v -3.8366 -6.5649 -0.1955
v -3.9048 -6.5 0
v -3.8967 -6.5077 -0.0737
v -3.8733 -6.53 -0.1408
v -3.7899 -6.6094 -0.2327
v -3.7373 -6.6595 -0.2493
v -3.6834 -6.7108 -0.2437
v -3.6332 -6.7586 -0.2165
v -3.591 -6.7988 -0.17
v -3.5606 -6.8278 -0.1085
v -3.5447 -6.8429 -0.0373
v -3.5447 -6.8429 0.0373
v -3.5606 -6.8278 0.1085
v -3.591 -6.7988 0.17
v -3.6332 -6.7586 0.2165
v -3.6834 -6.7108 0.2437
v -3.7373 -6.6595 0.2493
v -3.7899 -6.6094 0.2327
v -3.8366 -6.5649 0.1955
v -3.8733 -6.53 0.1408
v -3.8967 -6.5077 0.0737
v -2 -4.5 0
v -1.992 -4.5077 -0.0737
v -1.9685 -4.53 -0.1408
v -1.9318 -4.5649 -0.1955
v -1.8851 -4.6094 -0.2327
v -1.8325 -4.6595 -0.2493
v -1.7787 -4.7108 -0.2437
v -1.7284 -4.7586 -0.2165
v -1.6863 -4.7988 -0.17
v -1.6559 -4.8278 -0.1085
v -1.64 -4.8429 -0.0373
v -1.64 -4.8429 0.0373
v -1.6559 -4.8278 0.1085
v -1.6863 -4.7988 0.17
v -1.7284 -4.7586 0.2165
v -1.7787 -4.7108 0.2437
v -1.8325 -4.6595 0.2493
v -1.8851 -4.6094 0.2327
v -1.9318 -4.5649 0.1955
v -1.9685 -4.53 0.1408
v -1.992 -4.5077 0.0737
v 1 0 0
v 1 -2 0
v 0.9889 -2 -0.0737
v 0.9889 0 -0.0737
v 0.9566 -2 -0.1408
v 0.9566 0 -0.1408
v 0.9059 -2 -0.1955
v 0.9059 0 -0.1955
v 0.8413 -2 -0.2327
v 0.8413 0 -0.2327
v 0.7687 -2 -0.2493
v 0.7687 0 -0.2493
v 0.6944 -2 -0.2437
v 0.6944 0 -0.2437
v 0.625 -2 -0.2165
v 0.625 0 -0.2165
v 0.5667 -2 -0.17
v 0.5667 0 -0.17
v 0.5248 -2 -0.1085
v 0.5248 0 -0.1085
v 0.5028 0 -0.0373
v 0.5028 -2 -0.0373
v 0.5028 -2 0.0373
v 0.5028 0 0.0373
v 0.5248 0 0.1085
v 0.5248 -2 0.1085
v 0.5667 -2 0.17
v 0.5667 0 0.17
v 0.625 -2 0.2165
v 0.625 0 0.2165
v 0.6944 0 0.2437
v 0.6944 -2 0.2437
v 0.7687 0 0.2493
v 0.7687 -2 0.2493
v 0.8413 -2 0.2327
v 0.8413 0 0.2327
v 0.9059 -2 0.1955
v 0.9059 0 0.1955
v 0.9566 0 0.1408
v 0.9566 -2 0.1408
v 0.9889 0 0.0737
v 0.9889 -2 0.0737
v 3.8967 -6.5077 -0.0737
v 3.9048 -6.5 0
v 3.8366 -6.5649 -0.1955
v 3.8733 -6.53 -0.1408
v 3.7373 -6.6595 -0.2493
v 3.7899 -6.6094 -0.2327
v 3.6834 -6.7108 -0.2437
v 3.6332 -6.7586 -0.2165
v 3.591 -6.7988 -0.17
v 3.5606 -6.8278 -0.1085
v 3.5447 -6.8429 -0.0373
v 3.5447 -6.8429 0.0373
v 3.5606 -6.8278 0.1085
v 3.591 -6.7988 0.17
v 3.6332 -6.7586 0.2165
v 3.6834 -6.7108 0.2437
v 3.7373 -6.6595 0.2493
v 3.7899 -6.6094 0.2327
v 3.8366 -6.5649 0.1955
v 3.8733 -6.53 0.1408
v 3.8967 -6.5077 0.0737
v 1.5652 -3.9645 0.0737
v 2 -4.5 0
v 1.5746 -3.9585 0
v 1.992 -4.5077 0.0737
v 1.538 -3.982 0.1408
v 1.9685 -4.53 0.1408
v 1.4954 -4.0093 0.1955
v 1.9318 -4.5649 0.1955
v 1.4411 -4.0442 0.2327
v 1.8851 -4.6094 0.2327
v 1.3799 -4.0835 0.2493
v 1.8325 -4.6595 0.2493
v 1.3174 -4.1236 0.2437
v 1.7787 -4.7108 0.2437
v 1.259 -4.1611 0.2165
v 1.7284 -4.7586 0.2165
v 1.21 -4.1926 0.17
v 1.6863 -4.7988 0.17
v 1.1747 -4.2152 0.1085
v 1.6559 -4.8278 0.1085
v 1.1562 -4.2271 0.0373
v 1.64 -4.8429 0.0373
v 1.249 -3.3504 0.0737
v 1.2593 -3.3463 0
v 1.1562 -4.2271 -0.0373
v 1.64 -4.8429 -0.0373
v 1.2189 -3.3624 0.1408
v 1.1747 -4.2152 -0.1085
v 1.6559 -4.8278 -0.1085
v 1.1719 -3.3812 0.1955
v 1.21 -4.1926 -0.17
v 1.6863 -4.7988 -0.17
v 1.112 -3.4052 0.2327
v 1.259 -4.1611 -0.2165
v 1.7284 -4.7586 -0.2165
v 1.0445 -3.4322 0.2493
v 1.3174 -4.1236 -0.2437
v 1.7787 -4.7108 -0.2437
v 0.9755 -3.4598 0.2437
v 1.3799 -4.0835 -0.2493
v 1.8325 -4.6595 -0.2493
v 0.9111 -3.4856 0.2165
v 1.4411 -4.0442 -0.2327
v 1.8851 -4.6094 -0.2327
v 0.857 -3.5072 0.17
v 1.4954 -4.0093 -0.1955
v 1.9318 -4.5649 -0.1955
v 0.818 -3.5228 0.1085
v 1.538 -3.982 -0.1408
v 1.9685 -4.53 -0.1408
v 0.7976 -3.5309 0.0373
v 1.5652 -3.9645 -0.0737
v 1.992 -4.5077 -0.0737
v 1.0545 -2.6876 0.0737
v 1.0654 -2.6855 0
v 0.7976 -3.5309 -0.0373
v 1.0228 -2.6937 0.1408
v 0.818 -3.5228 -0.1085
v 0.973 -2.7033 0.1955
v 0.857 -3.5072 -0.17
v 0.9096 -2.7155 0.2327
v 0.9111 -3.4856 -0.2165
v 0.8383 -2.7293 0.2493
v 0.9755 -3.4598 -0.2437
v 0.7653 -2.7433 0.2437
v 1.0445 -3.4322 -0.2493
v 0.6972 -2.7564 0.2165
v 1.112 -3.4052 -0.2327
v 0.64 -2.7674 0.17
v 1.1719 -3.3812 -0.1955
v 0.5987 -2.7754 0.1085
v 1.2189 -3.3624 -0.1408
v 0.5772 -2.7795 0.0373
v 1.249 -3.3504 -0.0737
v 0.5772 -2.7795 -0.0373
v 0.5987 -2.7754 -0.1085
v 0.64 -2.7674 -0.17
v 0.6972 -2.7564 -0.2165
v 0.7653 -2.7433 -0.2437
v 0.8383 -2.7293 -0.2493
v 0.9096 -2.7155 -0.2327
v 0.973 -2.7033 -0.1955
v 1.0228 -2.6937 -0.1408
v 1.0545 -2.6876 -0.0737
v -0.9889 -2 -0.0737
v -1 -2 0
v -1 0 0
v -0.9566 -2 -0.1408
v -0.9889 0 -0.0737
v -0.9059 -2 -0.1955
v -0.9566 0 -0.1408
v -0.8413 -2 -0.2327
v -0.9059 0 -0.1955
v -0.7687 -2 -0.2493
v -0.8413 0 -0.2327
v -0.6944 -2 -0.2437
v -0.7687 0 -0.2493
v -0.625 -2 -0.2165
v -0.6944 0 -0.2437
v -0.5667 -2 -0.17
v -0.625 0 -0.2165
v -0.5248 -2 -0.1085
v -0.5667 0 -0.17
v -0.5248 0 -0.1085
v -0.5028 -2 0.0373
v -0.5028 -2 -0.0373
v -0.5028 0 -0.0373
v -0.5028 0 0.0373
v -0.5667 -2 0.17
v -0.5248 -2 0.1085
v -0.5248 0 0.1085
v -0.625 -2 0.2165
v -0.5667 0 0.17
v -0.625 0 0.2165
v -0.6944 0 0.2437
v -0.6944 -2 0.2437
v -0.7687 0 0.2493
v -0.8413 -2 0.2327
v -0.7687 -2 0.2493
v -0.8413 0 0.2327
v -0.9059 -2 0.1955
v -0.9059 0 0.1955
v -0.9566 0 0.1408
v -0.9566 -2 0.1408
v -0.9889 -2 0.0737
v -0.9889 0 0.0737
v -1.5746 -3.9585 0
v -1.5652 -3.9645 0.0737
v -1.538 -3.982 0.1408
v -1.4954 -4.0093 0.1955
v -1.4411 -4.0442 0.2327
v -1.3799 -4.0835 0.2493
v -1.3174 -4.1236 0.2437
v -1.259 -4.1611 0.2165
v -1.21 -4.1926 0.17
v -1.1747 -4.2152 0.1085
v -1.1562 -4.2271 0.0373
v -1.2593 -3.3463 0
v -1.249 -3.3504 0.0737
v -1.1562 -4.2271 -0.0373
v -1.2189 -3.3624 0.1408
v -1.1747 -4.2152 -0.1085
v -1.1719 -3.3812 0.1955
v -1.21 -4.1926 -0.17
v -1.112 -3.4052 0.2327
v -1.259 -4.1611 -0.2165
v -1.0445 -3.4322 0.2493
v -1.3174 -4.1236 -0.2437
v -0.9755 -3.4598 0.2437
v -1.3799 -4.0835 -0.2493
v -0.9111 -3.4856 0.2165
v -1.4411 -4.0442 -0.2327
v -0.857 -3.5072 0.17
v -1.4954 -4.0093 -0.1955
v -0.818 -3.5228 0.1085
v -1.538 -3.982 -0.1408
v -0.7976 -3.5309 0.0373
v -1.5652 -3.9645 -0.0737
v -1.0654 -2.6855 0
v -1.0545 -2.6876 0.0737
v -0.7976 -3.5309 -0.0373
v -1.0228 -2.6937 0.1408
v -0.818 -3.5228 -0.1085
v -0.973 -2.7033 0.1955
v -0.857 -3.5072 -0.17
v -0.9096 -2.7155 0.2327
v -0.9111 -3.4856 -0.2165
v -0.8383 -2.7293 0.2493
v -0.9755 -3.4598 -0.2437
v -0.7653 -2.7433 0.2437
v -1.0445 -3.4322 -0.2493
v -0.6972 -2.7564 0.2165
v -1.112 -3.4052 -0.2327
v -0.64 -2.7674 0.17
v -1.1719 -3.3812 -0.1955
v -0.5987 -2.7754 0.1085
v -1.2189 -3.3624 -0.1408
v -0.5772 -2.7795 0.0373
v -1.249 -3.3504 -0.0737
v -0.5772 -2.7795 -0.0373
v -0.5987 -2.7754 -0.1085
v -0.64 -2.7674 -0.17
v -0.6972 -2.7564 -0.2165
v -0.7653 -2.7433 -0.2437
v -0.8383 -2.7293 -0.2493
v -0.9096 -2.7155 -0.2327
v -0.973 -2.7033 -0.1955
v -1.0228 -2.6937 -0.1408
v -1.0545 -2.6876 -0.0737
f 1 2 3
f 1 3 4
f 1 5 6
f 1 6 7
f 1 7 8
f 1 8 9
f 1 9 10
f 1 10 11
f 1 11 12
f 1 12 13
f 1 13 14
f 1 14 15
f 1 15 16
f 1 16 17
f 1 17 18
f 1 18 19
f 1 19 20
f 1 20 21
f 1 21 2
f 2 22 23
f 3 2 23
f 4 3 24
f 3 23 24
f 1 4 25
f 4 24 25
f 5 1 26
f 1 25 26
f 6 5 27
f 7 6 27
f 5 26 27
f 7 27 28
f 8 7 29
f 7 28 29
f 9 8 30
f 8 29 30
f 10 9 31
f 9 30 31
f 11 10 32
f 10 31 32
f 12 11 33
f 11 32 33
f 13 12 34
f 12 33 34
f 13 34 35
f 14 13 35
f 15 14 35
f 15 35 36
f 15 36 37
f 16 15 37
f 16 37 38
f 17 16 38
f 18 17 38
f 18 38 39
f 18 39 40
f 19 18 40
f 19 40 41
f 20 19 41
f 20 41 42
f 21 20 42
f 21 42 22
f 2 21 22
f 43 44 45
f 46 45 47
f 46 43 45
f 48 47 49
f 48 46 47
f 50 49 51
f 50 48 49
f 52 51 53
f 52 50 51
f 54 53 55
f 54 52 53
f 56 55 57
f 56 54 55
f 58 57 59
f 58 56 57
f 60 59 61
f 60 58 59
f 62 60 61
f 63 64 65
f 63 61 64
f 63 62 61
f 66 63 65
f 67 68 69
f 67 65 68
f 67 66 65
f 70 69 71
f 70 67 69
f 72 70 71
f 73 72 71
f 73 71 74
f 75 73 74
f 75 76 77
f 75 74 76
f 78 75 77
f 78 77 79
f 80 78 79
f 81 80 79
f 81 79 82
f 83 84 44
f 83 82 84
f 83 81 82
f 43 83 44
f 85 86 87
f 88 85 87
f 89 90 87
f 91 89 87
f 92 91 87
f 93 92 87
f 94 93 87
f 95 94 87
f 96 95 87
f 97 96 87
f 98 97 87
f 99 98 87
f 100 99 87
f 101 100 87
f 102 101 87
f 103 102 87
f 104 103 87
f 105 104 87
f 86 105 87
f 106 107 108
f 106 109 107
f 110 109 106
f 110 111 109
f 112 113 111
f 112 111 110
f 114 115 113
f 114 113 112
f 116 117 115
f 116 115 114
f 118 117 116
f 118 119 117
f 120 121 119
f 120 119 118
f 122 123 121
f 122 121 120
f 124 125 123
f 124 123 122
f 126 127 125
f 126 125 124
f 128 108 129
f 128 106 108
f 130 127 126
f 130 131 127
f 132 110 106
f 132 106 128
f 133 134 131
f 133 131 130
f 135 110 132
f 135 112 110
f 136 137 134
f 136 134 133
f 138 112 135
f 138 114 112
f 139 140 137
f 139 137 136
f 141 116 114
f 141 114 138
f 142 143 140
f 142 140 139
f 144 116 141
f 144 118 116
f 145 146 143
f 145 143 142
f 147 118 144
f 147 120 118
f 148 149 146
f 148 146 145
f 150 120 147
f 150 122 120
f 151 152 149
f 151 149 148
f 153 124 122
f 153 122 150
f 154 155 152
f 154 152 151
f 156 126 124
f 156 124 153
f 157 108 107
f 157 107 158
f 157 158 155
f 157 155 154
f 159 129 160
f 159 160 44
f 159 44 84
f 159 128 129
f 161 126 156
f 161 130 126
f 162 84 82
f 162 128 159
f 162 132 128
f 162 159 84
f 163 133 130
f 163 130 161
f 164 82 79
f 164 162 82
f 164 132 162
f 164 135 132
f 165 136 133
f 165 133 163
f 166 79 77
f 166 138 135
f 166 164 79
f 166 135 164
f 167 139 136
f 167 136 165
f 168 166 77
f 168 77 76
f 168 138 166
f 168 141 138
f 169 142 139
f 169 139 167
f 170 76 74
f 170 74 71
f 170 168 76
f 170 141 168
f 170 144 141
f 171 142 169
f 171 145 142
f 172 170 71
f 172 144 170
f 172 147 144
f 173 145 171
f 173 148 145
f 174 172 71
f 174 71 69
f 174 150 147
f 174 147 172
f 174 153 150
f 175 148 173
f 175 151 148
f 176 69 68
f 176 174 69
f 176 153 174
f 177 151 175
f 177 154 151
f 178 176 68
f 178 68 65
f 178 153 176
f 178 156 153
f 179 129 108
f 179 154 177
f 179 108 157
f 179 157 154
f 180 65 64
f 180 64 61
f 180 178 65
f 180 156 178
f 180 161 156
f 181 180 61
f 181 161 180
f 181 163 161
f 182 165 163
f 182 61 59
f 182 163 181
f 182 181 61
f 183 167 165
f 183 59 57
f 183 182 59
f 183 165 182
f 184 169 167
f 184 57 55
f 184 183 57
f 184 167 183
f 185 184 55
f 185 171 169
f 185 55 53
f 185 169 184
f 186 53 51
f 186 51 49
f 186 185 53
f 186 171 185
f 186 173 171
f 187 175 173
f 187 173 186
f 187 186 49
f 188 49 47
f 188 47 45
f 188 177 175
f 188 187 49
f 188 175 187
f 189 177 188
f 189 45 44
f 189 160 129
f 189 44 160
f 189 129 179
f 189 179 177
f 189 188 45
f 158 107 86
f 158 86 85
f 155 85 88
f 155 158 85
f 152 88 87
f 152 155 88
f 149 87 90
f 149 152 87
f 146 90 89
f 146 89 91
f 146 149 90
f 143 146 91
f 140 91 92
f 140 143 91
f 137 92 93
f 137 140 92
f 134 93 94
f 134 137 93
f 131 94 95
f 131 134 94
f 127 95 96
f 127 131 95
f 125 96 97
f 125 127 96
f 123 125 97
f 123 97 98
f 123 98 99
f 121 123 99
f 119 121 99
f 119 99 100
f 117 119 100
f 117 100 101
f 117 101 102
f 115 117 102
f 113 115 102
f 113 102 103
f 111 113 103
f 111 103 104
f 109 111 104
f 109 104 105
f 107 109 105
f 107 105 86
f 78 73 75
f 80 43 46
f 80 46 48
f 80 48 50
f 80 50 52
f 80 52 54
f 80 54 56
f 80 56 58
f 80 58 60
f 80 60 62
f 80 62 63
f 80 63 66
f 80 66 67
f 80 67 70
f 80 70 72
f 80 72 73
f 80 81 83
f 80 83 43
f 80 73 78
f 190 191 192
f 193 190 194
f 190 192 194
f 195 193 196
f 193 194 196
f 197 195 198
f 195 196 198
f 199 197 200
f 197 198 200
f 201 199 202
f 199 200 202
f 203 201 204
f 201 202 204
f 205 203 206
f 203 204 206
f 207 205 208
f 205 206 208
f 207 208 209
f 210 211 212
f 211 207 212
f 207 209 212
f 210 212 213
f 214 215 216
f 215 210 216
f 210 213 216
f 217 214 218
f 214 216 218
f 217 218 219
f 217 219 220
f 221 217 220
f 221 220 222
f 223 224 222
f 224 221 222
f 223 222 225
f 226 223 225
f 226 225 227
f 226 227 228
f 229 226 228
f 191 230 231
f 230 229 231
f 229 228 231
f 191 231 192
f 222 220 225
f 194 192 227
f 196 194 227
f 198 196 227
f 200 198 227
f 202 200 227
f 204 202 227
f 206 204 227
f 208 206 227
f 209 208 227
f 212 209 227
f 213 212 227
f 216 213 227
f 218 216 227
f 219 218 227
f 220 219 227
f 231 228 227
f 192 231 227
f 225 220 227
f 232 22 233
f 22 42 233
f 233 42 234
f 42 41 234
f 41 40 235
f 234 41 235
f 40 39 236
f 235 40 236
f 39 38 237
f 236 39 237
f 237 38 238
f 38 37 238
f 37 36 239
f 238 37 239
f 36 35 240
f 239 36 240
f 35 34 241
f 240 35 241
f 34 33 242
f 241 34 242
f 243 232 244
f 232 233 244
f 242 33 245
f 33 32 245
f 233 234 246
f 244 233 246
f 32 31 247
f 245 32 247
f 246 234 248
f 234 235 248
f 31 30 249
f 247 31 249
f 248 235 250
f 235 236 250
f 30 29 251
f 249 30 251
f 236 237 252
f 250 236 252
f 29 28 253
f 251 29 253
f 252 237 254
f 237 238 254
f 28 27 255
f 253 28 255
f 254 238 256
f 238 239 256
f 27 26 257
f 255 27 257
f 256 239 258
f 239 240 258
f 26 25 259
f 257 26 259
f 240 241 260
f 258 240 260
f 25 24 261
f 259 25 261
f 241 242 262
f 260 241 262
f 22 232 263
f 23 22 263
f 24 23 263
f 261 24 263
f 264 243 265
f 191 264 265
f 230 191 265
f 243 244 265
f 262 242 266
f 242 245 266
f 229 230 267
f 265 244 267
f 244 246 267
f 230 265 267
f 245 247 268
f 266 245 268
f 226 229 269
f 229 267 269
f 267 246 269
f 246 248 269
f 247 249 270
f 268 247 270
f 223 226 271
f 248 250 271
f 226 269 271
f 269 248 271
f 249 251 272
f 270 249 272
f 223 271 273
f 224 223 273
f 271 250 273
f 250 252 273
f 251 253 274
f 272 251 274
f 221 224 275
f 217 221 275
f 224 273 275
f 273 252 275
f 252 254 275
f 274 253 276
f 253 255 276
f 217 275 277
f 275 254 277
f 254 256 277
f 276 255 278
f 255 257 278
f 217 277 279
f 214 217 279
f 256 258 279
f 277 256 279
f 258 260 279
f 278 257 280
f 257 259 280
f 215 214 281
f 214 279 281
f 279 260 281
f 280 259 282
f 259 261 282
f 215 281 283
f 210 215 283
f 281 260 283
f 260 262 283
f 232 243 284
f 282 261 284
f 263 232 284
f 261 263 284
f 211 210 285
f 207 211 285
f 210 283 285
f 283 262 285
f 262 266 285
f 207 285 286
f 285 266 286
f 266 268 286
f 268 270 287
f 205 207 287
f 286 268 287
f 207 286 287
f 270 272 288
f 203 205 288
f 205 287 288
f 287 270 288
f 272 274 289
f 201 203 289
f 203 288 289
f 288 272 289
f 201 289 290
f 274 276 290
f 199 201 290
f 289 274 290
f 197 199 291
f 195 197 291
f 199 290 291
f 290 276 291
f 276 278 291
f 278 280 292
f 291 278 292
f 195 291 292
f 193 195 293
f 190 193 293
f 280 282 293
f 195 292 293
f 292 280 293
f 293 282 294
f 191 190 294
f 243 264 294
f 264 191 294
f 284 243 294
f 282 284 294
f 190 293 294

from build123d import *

# Parameters (mm, degrees)
SKETCH2_R = 0.25


with BuildPart() as part:
    # Sweep1: sweep along a path in Sketch1
    with BuildLine(Plane.XY) as sweep1_path:
        Line((3.904761905, -6.5), (2, -4.5))
        ThreePointArc((2, -4.5), (1.259271996, -3.346291202), (1, -2))
        Line((1, -2), (1, 0))
    # Sketch2 → Sweep1 (sweep)
    with BuildSketch(Plane(origin=(0, 0, 0), x_dir=(1, 0, 0), z_dir=(0, 1, 0))):
        with Locations((0.75, 0)):
            Circle(SKETCH2_R)
    sweep(path=sweep1_path.line)


with BuildPart() as body_2:
    # Mirror3: mirrored copy
    add(part.part.mirror(Plane(origin=(0, 0, 0), x_dir=(0, 0, 1), z_dir=(1, 0, 0))))


solid = Compound([part.part, body_2.part])
